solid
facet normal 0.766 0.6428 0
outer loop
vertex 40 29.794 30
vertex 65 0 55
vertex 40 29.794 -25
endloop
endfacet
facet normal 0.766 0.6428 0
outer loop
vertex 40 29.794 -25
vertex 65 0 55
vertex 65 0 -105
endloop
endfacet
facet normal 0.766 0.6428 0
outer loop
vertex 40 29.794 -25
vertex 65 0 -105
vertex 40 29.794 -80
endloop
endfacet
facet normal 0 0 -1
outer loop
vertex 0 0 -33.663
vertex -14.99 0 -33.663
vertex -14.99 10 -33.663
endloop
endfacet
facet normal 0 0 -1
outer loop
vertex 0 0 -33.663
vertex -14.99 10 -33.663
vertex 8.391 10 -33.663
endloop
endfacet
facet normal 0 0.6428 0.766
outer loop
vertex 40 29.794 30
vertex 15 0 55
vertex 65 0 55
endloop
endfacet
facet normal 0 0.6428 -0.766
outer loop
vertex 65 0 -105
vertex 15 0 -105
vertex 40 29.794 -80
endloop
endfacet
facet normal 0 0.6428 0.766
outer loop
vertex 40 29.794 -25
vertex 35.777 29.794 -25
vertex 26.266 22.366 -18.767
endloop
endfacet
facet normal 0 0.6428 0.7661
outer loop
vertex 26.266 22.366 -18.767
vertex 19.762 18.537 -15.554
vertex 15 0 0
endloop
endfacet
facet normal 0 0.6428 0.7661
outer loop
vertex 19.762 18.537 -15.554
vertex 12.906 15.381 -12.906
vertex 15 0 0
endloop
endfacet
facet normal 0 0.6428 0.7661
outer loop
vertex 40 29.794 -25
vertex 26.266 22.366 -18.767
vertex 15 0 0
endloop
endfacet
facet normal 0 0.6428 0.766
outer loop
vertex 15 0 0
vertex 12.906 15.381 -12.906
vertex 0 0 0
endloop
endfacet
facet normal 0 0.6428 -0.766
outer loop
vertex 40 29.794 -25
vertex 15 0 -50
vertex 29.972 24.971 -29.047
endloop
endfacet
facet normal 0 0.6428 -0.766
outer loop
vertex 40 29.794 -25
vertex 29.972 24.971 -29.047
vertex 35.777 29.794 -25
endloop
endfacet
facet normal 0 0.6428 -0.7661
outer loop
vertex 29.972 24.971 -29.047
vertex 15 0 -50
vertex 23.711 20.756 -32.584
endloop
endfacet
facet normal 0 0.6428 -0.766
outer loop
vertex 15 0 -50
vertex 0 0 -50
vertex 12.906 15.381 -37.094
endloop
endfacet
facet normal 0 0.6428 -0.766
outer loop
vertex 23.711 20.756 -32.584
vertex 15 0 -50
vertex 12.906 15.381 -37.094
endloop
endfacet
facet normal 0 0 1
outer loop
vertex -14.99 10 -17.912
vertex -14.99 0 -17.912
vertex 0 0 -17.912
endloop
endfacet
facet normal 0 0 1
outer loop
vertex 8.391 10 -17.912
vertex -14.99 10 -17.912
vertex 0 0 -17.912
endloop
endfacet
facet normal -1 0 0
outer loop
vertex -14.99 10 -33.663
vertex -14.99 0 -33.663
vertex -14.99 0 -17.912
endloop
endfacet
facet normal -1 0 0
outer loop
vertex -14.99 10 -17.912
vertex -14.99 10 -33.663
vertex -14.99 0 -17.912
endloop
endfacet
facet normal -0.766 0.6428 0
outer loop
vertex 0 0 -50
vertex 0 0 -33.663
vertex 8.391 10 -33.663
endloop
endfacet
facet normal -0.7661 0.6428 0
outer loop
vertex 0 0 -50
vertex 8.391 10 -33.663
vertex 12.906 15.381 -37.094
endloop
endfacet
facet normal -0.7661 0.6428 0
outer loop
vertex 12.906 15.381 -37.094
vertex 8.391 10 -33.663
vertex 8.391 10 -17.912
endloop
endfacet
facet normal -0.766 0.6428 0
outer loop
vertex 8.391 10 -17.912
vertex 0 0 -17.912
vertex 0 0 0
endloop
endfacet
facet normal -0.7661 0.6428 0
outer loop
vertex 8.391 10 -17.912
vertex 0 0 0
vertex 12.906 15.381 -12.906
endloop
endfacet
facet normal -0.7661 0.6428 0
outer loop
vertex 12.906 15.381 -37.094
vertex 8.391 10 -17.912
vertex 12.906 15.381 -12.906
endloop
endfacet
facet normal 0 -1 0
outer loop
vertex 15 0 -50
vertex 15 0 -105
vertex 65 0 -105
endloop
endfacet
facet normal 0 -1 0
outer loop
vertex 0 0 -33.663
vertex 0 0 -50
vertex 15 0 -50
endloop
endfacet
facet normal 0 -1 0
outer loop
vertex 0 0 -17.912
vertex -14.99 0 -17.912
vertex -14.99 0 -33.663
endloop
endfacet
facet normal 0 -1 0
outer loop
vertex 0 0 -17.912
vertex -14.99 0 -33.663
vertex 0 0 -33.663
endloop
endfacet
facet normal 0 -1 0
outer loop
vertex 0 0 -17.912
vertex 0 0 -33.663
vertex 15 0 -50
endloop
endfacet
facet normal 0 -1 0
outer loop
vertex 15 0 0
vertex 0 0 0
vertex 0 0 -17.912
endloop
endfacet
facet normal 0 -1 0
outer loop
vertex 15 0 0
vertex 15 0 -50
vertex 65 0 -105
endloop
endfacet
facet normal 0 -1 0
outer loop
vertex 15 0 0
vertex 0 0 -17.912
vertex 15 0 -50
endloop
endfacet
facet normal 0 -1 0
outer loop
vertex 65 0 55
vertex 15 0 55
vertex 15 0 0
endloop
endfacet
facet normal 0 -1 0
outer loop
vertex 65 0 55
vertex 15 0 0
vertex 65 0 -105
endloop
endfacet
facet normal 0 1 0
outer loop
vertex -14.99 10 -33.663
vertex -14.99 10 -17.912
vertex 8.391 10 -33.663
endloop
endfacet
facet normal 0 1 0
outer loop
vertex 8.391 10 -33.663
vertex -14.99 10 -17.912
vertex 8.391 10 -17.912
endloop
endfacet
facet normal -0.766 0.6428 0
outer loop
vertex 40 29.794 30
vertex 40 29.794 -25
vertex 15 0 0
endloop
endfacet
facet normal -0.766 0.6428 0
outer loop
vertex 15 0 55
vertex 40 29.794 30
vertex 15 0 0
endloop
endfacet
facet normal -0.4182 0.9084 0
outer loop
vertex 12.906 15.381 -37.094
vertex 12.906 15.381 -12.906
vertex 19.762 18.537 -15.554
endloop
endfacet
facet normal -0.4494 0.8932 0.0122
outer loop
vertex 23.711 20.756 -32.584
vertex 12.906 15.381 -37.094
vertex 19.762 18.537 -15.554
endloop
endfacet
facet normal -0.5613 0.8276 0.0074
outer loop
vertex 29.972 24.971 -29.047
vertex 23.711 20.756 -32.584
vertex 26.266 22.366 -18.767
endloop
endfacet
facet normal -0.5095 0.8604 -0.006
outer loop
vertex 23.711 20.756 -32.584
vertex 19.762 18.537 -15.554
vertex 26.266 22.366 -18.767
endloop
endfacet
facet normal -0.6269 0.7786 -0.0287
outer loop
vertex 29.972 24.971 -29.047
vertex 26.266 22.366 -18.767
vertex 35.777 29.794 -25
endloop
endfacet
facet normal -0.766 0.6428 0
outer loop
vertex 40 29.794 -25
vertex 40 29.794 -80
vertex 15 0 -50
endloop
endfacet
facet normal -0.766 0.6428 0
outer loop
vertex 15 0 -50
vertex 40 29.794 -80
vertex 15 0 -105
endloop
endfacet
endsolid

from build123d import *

# Parameters (mm, degrees)
BOSS_EXTRUDE1_START       = -105
BOSS_EXTRUDE1_DEPTH       = 160
BOSS_EXTRUDE1_2_DEPTH     = 40
BOSS_EXTRUDE1_START_2     = -20
BOSS_EXTRUDE1_3_OUTLINE_W = 47
BOSS_EXTRUDE1_3_OUTLINE_H = 147
BOSS_EXTRUDE1_3_DEPTH     = 20
BOSS_EXTRUDE1_START_3     = 42.132444372
BOSS_EXTRUDE1_4_OUTLINE_W = 53
BOSS_EXTRUDE1_4_OUTLINE_H = 116
BOSS_EXTRUDE1_4_DEPTH     = 19.867555628
BOSS_EXTRUDE1_START_4     = 80.434666527
BOSS_EXTRUDE1_5_OUTLINE_W = 52
BOSS_EXTRUDE1_5_OUTLINE_H = 117
BOSS_EXTRUDE1_5_DEPTH     = 20.565333473
SKETCH3_W                 = 27.900715286
SKETCH3_H                 = 15.750403791
BOSS_EXTRUDE2_DEPTH       = 10
SKETCH4_R                 = 75
CUT_EXTRUDE1_DEPTH        = 80


with BuildPart() as part:
    # Boss-Extrude1: read off the stored shape, not the designer's step
    # Boss-Extrude1 outline → Boss-Extrude1 (new body)
    with BuildSketch(Plane.XY.offset(BOSS_EXTRUDE1_START)):
        Polygon((65, 0), (40, 29.793839815), (15, 0), align=None)
    extrude(amount=BOSS_EXTRUDE1_DEPTH)

    # Boss-Extrude1 2 outline → Boss-Extrude1 2 (add)
    with BuildSketch(Plane.YZ):
        Polygon((0, -50), (29.793839815, -25), (0, 0), align=None)
    extrude(amount=BOSS_EXTRUDE1_2_DEPTH)

    # Boss-Extrude1 3 outline → Boss-Extrude1 3 (cut)
    with BuildSketch(Plane(origin=(0, 0, 0), x_dir=(0.6427876096865404, 0.7660444431189772, 0), z_dir=(0.7660444431189772, -0.6427876096865403, 0)).offset(BOSS_EXTRUDE1_START_2)):
        with Locations((22.5, -24.5)):
            Rectangle(BOSS_EXTRUDE1_3_OUTLINE_W, BOSS_EXTRUDE1_3_OUTLINE_H)
    extrude(amount=BOSS_EXTRUDE1_3_DEPTH, mode=Mode.SUBTRACT)

    # Boss-Extrude1 4 outline → Boss-Extrude1 4 (cut)
    with BuildSketch(Plane(origin=(0, 0, 0), x_dir=(1, 0, 0), z_dir=(0, 0.6427876096865403, 0.7660444431189772)).offset(BOSS_EXTRUDE1_START_3)):
        with Locations((40.5, 21)):
            Rectangle(BOSS_EXTRUDE1_4_OUTLINE_W, BOSS_EXTRUDE1_4_OUTLINE_H)
    extrude(amount=BOSS_EXTRUDE1_4_DEPTH, mode=Mode.SUBTRACT)

    # Boss-Extrude1 5 outline → Boss-Extrude1 5 (cut)
    with BuildSketch(Plane(origin=(0, 0, 0), x_dir=(1, 0, 0), z_dir=(0, 0.6427876096865403, -0.7660444431189772)).offset(BOSS_EXTRUDE1_START_4)):
        with Locations((40, 10.5)):
            Rectangle(BOSS_EXTRUDE1_5_OUTLINE_W, BOSS_EXTRUDE1_5_OUTLINE_H)
    extrude(amount=BOSS_EXTRUDE1_5_DEPTH, mode=Mode.SUBTRACT)

    # Sketch3 → Boss-Extrude2 (add)
    with BuildSketch(Plane.XZ):
        with Locations((-1.039193036, -25.78752019)):
            Rectangle(SKETCH3_W, SKETCH3_H)
    extrude(amount=-BOSS_EXTRUDE2_DEPTH)

    # Sketch4 → Cut-Extrude1 (cut, symmetric)
    with BuildSketch(Plane.XY):
        with Locations((-14.989550679, 85)):
            Circle(SKETCH4_R)
    extrude(amount=CUT_EXTRUDE1_DEPTH, both=True, mode=Mode.SUBTRACT)


solid = part.part
